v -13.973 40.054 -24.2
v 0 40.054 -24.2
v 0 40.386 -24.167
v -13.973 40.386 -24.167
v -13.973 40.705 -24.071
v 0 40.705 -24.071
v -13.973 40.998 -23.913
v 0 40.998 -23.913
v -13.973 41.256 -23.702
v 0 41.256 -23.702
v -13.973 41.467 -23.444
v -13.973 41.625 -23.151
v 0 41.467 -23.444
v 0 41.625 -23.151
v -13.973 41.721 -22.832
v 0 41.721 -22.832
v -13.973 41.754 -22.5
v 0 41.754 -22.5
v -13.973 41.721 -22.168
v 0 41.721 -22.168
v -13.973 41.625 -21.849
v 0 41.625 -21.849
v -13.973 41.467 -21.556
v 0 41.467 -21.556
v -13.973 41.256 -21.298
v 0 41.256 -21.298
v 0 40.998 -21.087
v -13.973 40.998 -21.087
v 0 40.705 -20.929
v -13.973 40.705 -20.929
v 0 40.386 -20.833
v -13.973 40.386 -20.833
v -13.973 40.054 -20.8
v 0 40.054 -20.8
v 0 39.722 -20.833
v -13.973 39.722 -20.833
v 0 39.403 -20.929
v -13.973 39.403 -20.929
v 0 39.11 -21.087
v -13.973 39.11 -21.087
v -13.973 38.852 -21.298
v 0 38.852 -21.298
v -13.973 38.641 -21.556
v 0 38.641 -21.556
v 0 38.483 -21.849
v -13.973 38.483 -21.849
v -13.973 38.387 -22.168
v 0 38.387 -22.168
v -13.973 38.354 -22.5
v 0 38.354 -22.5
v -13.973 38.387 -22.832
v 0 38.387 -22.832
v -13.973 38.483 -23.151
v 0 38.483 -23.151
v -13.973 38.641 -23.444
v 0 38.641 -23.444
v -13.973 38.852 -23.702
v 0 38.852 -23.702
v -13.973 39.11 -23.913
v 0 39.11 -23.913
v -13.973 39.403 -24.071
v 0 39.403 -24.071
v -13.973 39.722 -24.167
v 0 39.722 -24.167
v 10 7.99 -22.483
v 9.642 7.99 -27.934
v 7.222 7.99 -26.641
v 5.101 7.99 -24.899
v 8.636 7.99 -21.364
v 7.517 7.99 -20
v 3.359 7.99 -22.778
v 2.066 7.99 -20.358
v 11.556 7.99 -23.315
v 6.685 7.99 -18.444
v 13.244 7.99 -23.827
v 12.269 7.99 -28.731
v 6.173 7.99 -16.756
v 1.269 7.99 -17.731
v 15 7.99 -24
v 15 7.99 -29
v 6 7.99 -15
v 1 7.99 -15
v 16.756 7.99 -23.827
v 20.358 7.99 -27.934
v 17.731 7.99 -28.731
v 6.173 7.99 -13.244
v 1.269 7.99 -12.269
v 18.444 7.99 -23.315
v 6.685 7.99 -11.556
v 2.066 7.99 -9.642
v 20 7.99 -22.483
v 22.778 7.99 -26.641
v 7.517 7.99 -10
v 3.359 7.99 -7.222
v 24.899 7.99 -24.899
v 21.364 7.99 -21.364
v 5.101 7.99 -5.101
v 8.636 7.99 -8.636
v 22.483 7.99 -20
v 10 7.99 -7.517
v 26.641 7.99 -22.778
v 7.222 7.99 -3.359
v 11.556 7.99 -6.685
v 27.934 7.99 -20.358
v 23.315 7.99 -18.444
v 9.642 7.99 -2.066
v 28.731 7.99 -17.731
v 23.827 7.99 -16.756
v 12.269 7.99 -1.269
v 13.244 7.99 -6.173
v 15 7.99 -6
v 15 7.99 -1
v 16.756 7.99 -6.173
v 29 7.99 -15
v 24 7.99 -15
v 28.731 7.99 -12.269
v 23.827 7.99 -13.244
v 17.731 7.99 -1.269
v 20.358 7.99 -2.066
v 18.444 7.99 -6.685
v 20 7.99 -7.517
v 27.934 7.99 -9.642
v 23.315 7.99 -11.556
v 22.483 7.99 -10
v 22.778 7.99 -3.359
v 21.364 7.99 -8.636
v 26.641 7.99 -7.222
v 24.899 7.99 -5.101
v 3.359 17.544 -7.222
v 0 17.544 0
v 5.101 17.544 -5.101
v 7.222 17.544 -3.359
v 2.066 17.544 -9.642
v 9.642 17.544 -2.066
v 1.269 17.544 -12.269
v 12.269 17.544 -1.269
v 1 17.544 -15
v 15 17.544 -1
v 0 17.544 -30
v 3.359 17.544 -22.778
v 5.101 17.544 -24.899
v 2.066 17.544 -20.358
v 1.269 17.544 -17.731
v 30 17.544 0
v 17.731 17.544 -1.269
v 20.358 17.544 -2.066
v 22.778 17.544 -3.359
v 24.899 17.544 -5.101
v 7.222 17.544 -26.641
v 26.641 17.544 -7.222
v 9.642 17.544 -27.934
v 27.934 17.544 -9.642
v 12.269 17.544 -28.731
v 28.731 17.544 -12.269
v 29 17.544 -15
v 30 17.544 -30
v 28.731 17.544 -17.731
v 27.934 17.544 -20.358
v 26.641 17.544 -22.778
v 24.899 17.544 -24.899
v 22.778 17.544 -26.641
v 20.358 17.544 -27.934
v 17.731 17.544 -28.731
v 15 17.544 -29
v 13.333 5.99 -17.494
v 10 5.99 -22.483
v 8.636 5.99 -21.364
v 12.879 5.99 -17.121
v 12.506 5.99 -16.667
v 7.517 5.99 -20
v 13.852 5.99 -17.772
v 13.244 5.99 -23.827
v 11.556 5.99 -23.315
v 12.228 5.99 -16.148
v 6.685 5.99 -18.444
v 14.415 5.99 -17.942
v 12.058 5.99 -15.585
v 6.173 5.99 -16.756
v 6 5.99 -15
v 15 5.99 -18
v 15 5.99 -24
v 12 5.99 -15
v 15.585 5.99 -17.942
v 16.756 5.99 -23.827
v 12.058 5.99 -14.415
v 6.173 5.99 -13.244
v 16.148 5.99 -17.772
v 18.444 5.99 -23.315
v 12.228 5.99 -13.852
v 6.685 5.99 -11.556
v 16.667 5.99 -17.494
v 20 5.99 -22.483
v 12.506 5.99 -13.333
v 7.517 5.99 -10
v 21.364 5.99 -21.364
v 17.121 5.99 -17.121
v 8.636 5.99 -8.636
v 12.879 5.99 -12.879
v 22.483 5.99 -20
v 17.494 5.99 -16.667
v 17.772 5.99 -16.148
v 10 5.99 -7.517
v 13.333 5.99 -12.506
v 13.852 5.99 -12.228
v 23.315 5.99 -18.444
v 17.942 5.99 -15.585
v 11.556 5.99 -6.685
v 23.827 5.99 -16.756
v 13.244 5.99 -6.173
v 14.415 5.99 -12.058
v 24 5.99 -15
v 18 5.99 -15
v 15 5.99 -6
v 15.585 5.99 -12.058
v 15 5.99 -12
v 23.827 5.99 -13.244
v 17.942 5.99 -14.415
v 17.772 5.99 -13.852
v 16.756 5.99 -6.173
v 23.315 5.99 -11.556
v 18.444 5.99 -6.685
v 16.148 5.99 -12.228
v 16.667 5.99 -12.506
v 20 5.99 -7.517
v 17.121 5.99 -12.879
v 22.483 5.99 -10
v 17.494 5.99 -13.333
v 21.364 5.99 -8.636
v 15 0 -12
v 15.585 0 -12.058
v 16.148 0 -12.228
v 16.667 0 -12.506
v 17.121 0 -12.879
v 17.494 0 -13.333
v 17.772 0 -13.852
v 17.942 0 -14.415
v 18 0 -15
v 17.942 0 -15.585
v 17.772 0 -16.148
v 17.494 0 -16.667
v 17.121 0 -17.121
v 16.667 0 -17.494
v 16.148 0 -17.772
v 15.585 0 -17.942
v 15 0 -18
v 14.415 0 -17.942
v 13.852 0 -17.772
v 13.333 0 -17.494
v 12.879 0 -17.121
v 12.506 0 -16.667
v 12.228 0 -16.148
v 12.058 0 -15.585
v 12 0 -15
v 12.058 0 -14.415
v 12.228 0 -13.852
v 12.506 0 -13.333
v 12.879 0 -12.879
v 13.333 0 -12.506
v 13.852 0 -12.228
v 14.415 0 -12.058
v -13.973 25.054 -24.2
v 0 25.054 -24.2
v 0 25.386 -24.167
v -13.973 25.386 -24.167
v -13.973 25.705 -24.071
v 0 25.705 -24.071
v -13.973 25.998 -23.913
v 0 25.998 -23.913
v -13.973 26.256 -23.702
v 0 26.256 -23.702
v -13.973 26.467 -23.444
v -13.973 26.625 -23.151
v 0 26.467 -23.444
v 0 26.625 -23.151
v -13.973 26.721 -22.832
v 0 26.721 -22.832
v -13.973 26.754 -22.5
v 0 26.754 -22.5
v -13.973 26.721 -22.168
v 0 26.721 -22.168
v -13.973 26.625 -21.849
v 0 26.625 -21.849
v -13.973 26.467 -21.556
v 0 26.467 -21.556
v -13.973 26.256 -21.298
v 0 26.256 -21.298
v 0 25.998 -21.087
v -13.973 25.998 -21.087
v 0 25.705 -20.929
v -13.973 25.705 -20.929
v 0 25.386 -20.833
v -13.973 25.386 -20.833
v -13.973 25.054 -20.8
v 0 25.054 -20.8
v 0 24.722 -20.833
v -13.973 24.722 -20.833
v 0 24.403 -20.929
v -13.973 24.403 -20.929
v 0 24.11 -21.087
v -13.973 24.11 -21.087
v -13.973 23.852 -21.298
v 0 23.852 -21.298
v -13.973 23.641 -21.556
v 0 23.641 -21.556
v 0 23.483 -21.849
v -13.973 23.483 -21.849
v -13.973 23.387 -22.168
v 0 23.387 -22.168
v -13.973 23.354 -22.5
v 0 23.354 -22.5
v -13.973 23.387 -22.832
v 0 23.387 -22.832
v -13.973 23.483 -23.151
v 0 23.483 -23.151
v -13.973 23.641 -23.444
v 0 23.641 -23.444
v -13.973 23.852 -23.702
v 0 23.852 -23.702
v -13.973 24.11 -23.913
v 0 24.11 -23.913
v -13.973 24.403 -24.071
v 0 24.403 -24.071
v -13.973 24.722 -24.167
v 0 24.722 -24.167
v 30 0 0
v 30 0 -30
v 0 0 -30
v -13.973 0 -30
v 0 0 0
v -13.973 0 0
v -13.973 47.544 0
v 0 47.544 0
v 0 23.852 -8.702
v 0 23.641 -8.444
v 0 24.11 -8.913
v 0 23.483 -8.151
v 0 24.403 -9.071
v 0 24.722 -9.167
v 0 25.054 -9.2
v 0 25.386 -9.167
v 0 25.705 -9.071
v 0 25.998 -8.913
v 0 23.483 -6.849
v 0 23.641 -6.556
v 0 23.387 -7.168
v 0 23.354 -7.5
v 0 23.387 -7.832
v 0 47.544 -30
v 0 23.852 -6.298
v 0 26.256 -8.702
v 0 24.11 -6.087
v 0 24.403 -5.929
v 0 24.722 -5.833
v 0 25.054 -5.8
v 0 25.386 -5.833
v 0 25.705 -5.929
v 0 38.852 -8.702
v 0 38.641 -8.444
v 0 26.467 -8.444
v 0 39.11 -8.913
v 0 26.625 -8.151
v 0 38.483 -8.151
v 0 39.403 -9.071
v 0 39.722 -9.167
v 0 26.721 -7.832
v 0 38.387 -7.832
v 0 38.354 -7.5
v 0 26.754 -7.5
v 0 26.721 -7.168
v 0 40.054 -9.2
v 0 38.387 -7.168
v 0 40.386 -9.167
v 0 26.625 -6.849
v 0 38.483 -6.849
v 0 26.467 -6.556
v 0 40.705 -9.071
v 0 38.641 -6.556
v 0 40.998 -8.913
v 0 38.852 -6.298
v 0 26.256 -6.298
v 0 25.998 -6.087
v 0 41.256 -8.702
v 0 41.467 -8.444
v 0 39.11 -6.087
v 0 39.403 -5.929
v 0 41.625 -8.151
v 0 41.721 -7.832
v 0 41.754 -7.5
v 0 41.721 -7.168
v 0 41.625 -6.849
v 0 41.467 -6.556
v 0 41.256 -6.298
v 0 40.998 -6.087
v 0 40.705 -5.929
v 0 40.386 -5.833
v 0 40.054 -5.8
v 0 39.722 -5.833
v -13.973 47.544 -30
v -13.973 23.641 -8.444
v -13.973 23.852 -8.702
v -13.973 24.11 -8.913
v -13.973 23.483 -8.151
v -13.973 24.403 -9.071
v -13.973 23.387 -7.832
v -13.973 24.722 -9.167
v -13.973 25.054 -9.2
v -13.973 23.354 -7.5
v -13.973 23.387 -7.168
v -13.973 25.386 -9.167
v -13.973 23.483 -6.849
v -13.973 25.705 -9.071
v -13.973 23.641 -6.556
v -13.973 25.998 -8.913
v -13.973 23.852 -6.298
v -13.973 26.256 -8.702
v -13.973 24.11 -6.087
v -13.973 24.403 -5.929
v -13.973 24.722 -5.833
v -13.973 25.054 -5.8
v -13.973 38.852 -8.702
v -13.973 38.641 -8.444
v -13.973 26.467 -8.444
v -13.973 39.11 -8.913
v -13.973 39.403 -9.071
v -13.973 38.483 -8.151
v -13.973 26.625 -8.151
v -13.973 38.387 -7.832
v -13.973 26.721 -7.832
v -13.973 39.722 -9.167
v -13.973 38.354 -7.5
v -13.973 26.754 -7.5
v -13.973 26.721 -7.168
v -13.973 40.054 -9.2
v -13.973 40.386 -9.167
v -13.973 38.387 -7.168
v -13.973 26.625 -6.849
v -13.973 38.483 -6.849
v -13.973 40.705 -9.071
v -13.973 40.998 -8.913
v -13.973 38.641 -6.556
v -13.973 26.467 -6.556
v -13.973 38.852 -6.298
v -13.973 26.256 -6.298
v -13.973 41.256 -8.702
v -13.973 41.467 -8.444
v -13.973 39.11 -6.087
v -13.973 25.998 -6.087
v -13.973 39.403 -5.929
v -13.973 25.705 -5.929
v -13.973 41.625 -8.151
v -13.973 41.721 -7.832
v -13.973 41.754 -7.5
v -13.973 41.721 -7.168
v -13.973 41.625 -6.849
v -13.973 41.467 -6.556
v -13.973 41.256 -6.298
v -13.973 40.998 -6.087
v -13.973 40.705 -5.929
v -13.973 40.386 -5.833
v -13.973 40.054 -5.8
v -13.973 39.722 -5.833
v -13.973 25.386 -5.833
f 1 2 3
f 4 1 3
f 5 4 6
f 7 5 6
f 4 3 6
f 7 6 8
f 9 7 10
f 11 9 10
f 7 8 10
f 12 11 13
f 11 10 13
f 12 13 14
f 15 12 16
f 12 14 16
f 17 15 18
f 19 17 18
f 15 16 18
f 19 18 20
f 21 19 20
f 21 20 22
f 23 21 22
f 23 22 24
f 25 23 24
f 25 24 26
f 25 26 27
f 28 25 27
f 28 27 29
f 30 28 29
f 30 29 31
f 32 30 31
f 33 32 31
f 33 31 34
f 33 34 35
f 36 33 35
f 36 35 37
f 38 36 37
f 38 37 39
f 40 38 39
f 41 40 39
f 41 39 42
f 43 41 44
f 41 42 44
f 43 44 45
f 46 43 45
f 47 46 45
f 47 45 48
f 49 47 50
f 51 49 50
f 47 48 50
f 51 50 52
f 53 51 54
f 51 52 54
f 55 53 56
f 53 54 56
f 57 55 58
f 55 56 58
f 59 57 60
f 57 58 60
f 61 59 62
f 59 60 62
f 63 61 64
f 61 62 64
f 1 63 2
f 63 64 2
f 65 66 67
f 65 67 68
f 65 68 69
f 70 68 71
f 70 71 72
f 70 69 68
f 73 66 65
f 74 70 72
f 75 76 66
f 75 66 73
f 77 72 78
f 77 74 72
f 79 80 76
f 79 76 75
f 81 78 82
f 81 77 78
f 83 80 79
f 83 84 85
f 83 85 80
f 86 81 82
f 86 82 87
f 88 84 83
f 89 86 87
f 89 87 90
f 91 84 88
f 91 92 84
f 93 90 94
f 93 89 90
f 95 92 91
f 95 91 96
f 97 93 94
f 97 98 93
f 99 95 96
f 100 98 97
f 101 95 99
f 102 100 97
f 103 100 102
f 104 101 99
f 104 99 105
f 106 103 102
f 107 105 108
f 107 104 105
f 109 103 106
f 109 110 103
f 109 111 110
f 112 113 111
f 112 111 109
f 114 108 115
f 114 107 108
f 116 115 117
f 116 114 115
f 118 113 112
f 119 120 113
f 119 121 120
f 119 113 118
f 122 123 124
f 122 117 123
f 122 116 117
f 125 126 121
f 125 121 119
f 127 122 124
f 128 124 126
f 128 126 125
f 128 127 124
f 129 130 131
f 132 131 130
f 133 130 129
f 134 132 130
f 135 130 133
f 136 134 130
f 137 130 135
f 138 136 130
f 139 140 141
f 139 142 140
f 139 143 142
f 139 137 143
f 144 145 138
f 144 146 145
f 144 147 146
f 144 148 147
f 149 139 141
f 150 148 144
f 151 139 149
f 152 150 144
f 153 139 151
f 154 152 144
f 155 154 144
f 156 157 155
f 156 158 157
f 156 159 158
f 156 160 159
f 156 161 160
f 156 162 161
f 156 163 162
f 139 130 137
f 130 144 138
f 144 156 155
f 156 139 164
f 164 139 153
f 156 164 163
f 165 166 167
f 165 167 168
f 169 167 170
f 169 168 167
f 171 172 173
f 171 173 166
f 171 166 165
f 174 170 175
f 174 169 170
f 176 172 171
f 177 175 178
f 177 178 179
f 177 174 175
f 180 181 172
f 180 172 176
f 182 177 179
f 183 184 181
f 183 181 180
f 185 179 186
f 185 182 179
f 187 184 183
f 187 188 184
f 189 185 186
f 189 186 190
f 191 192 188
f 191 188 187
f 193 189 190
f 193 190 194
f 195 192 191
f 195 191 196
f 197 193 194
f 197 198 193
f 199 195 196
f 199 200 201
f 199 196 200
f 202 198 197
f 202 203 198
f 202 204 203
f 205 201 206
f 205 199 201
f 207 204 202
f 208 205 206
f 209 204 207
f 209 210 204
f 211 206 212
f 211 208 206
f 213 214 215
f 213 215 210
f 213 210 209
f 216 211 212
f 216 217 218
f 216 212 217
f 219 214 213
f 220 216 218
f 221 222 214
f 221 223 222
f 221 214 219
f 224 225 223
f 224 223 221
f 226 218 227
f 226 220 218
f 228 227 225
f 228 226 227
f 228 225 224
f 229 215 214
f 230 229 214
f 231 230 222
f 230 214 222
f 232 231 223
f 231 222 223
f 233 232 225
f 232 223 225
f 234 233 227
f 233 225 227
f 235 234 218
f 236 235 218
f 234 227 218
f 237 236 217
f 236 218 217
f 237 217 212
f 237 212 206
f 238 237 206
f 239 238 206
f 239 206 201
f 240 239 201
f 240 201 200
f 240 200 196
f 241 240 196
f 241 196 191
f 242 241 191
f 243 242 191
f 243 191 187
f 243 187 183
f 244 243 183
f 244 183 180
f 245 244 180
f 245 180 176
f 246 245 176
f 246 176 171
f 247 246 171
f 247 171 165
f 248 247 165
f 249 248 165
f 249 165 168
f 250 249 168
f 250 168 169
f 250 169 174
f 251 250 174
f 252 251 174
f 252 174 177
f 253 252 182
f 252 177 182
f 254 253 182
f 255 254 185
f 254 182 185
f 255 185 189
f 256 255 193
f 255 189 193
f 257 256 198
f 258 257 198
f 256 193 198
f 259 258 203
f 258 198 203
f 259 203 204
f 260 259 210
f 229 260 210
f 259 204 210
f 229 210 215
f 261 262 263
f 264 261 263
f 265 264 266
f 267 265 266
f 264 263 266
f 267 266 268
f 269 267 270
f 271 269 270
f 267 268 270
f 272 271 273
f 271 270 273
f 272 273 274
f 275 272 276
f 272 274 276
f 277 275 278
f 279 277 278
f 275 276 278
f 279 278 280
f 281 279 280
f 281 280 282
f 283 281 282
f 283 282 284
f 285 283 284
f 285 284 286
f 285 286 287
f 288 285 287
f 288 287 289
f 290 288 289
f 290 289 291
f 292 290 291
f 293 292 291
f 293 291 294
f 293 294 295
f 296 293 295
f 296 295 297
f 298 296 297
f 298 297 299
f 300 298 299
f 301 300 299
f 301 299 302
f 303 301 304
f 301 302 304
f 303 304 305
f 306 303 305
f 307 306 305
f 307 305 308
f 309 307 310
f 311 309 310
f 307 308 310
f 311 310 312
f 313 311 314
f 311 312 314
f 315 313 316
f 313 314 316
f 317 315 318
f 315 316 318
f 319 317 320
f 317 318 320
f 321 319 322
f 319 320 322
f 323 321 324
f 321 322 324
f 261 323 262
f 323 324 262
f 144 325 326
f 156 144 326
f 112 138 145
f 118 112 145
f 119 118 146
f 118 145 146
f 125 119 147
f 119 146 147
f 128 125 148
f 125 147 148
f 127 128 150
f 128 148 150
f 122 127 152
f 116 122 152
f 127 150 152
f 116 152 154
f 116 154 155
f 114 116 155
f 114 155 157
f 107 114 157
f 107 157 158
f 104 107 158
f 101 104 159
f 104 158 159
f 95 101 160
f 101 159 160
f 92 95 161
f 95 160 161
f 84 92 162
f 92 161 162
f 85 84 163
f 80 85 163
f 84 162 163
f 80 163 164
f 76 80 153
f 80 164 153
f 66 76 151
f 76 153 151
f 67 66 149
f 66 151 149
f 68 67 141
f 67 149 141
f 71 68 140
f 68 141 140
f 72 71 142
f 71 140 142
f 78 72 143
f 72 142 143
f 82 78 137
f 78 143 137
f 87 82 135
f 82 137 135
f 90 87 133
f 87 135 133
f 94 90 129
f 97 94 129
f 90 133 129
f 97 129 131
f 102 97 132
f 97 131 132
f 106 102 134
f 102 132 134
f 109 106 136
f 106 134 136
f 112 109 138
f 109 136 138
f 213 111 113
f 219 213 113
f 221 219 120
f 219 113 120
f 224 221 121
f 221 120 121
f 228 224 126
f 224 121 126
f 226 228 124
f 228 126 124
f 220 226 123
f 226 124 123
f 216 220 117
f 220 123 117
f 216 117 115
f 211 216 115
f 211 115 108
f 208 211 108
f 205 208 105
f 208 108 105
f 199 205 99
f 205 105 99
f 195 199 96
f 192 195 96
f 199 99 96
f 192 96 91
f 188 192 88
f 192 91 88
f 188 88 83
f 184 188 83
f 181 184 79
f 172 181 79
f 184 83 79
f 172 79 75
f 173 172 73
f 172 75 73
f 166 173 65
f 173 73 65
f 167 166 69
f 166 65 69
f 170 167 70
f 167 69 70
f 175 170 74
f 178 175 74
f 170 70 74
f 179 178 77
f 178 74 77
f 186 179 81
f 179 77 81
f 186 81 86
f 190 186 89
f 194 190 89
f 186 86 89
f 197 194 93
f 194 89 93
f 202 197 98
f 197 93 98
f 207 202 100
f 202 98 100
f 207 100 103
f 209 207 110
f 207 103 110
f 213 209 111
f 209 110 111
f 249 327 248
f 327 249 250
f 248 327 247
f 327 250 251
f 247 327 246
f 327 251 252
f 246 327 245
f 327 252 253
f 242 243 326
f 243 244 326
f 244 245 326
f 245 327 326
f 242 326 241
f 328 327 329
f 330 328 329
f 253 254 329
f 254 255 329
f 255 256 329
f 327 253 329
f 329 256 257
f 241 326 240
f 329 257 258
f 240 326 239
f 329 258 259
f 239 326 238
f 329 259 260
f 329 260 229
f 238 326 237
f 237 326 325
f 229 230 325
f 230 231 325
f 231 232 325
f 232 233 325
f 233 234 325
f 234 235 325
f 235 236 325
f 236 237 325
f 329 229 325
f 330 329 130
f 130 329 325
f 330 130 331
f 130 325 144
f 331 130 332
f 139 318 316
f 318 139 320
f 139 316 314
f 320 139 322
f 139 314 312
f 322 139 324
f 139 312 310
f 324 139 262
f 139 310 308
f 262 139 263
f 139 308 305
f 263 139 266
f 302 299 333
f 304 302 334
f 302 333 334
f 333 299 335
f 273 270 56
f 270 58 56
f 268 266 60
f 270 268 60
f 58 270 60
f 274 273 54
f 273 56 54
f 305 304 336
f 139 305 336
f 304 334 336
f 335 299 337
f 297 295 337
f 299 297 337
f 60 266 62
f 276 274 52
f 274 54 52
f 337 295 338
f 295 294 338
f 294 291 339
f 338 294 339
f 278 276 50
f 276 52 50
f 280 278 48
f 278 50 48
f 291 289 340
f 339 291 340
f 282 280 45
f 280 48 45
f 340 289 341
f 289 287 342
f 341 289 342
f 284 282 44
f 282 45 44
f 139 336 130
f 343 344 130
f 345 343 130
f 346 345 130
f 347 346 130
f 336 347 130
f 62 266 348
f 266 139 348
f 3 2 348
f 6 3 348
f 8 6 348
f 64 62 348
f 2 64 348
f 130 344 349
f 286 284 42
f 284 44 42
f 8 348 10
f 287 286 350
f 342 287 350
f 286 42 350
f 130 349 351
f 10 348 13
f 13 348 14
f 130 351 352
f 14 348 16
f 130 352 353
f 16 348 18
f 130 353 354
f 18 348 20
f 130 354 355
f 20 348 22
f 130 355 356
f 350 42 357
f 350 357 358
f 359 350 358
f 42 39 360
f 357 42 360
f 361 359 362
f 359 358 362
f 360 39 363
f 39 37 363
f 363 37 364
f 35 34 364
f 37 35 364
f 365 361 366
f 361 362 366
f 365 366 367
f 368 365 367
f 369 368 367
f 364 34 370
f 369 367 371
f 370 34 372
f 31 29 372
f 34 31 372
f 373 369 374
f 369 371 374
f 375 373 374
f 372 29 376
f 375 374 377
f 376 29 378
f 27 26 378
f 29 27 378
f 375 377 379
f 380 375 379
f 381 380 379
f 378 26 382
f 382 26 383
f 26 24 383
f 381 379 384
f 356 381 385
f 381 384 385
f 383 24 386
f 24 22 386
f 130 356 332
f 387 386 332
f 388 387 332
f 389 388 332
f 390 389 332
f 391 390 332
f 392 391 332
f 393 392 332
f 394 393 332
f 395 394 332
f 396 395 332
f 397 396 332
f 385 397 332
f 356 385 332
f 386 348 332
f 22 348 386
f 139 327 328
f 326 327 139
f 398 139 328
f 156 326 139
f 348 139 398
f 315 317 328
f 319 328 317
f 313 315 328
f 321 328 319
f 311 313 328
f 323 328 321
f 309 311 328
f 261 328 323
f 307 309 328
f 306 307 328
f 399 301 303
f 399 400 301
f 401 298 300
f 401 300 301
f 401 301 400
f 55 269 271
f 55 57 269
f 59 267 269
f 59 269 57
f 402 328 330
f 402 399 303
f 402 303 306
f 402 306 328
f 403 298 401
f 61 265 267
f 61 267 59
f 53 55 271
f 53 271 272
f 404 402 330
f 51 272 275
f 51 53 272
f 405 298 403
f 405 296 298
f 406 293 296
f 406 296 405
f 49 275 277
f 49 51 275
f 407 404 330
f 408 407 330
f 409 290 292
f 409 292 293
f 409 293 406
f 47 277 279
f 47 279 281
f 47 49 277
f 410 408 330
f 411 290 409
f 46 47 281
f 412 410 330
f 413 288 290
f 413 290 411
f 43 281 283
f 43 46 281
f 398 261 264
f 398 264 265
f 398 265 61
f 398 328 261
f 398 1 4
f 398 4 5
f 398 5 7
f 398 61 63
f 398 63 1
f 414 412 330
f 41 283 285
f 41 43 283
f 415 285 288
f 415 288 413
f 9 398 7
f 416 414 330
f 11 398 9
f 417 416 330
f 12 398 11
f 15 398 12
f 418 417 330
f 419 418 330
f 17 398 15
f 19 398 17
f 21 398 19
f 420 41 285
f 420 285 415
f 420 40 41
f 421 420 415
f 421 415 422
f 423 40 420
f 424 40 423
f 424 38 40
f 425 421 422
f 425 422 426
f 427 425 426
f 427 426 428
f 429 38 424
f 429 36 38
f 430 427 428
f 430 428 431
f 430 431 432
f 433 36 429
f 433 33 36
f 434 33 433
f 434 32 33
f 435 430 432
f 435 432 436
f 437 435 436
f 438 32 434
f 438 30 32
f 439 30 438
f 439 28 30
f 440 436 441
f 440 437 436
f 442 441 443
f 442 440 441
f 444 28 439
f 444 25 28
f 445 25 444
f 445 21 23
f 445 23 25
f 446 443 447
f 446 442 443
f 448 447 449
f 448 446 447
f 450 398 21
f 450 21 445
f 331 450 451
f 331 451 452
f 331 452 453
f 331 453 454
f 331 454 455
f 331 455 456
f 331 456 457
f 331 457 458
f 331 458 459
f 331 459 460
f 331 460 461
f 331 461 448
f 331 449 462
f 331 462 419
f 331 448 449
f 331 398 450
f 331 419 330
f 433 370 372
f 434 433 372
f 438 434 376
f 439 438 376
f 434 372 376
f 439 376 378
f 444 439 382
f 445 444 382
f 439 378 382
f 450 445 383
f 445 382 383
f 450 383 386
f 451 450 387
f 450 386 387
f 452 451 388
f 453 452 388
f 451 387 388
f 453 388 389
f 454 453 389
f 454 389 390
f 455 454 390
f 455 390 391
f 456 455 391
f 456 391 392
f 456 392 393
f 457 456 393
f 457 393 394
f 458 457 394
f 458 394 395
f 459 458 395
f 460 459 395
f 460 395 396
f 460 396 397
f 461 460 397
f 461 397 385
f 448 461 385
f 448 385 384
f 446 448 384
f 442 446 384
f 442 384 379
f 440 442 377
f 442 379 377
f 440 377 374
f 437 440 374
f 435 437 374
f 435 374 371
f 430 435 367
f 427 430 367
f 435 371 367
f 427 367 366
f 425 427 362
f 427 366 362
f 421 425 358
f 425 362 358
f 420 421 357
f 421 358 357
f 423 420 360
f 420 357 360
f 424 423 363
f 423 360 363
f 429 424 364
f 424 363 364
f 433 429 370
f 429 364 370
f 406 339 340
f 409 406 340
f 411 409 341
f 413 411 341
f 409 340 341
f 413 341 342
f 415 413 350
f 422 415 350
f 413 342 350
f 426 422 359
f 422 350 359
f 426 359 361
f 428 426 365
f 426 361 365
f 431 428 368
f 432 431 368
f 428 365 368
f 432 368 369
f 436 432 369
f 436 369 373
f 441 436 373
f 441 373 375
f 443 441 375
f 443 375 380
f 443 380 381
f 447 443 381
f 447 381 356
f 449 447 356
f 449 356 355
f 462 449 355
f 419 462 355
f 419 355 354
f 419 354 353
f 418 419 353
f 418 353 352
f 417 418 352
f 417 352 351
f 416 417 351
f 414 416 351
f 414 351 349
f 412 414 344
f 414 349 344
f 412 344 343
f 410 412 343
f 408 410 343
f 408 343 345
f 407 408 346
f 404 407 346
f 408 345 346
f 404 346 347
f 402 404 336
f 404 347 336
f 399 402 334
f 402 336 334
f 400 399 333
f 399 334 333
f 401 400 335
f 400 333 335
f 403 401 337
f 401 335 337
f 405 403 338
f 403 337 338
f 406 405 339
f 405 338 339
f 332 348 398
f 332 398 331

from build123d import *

# Parameters (mm, degrees)
SKETCH3_W           = 30
SKETCH3_H           = 30
BOSS_EXTRUDE2_DEPTH = 17.544106429
SKETCH8_R           = 14
CUT_EXTRUDE1_DEPTH  = 9.554
SKETCH9_R           = 9
CUT_EXTRUDE2_DEPTH  = 2
SKETCH10_R          = 3
CUT_EXTRUDE3_DEPTH  = 44.971523922
SKETCH13_W          = 30
SKETCH13_H          = 47.544106429
BOSS_EXTRUDE3_DEPTH = 13.972846029
SKETCH14_R          = 1.7
CUT_EXTRUDE4_DEPTH  = 64.721598035


with BuildPart() as part:
    # Sketch3 → Boss-Extrude2 (new body)
    with BuildSketch(Plane(origin=(0, 0, 0), x_dir=(1, 0, 0), z_dir=(0, 1, 0))):
        with Locations((15, 15)):
            Rectangle(SKETCH3_W, SKETCH3_H)
    extrude(amount=BOSS_EXTRUDE2_DEPTH)

    # Sketch8 → Cut-Extrude1 (cut)
    with BuildSketch(Plane(origin=(0, 17.544106429, 0), x_dir=(1, 0, 0), z_dir=(0, 1, 0))):
        with Locations(Location((15, 15, 0), (0, 0, 270))):
            Circle(SKETCH8_R)
    extrude(amount=-CUT_EXTRUDE1_DEPTH, mode=Mode.SUBTRACT)

    # Sketch9 → Cut-Extrude2 (cut)
    with BuildSketch(Plane(origin=(0, 7.990106429, 0), x_dir=(1, 0, 0), z_dir=(0, 1, 0))):
        with Locations(Location((15, 15, 0), (0, 0, 270))):
            Circle(SKETCH9_R)
    extrude(amount=-CUT_EXTRUDE2_DEPTH, mode=Mode.SUBTRACT)

    # Sketch10 → Cut-Extrude3 (cut, through all)
    with BuildSketch(Plane(origin=(0, 5.990106429, 0), x_dir=(1, 0, 0), z_dir=(0, 1, 0))):
        with Locations(Location((15, 15, 0), (0, 0, 270))):
            Circle(SKETCH10_R)
    extrude(amount=-CUT_EXTRUDE3_DEPTH, mode=Mode.SUBTRACT)

    # Sketch13 → Boss-Extrude3 (add)
    with BuildSketch(Plane.ZY):
        with Locations((-15, 23.772053215)):
            Rectangle(SKETCH13_W, SKETCH13_H)
    extrude(amount=BOSS_EXTRUDE3_DEPTH)

    # Sketch14 → Cut-Extrude4 (cut, through all)
    with BuildSketch(Plane(origin=(0, 0, 0), x_dir=(0, 0, -1), z_dir=(1, 0, 0))):
        with Locations((7.5, 25.054)):
            Circle(SKETCH14_R)
        with Locations((7.5, 40.054)):
            Circle(SKETCH14_R)
        with Locations((22.5, 25.054)):
            Circle(SKETCH14_R)
        with Locations((22.5, 40.054)):
            Circle(SKETCH14_R)
    extrude(amount=-CUT_EXTRUDE4_DEPTH, mode=Mode.SUBTRACT)


solid = part.part
